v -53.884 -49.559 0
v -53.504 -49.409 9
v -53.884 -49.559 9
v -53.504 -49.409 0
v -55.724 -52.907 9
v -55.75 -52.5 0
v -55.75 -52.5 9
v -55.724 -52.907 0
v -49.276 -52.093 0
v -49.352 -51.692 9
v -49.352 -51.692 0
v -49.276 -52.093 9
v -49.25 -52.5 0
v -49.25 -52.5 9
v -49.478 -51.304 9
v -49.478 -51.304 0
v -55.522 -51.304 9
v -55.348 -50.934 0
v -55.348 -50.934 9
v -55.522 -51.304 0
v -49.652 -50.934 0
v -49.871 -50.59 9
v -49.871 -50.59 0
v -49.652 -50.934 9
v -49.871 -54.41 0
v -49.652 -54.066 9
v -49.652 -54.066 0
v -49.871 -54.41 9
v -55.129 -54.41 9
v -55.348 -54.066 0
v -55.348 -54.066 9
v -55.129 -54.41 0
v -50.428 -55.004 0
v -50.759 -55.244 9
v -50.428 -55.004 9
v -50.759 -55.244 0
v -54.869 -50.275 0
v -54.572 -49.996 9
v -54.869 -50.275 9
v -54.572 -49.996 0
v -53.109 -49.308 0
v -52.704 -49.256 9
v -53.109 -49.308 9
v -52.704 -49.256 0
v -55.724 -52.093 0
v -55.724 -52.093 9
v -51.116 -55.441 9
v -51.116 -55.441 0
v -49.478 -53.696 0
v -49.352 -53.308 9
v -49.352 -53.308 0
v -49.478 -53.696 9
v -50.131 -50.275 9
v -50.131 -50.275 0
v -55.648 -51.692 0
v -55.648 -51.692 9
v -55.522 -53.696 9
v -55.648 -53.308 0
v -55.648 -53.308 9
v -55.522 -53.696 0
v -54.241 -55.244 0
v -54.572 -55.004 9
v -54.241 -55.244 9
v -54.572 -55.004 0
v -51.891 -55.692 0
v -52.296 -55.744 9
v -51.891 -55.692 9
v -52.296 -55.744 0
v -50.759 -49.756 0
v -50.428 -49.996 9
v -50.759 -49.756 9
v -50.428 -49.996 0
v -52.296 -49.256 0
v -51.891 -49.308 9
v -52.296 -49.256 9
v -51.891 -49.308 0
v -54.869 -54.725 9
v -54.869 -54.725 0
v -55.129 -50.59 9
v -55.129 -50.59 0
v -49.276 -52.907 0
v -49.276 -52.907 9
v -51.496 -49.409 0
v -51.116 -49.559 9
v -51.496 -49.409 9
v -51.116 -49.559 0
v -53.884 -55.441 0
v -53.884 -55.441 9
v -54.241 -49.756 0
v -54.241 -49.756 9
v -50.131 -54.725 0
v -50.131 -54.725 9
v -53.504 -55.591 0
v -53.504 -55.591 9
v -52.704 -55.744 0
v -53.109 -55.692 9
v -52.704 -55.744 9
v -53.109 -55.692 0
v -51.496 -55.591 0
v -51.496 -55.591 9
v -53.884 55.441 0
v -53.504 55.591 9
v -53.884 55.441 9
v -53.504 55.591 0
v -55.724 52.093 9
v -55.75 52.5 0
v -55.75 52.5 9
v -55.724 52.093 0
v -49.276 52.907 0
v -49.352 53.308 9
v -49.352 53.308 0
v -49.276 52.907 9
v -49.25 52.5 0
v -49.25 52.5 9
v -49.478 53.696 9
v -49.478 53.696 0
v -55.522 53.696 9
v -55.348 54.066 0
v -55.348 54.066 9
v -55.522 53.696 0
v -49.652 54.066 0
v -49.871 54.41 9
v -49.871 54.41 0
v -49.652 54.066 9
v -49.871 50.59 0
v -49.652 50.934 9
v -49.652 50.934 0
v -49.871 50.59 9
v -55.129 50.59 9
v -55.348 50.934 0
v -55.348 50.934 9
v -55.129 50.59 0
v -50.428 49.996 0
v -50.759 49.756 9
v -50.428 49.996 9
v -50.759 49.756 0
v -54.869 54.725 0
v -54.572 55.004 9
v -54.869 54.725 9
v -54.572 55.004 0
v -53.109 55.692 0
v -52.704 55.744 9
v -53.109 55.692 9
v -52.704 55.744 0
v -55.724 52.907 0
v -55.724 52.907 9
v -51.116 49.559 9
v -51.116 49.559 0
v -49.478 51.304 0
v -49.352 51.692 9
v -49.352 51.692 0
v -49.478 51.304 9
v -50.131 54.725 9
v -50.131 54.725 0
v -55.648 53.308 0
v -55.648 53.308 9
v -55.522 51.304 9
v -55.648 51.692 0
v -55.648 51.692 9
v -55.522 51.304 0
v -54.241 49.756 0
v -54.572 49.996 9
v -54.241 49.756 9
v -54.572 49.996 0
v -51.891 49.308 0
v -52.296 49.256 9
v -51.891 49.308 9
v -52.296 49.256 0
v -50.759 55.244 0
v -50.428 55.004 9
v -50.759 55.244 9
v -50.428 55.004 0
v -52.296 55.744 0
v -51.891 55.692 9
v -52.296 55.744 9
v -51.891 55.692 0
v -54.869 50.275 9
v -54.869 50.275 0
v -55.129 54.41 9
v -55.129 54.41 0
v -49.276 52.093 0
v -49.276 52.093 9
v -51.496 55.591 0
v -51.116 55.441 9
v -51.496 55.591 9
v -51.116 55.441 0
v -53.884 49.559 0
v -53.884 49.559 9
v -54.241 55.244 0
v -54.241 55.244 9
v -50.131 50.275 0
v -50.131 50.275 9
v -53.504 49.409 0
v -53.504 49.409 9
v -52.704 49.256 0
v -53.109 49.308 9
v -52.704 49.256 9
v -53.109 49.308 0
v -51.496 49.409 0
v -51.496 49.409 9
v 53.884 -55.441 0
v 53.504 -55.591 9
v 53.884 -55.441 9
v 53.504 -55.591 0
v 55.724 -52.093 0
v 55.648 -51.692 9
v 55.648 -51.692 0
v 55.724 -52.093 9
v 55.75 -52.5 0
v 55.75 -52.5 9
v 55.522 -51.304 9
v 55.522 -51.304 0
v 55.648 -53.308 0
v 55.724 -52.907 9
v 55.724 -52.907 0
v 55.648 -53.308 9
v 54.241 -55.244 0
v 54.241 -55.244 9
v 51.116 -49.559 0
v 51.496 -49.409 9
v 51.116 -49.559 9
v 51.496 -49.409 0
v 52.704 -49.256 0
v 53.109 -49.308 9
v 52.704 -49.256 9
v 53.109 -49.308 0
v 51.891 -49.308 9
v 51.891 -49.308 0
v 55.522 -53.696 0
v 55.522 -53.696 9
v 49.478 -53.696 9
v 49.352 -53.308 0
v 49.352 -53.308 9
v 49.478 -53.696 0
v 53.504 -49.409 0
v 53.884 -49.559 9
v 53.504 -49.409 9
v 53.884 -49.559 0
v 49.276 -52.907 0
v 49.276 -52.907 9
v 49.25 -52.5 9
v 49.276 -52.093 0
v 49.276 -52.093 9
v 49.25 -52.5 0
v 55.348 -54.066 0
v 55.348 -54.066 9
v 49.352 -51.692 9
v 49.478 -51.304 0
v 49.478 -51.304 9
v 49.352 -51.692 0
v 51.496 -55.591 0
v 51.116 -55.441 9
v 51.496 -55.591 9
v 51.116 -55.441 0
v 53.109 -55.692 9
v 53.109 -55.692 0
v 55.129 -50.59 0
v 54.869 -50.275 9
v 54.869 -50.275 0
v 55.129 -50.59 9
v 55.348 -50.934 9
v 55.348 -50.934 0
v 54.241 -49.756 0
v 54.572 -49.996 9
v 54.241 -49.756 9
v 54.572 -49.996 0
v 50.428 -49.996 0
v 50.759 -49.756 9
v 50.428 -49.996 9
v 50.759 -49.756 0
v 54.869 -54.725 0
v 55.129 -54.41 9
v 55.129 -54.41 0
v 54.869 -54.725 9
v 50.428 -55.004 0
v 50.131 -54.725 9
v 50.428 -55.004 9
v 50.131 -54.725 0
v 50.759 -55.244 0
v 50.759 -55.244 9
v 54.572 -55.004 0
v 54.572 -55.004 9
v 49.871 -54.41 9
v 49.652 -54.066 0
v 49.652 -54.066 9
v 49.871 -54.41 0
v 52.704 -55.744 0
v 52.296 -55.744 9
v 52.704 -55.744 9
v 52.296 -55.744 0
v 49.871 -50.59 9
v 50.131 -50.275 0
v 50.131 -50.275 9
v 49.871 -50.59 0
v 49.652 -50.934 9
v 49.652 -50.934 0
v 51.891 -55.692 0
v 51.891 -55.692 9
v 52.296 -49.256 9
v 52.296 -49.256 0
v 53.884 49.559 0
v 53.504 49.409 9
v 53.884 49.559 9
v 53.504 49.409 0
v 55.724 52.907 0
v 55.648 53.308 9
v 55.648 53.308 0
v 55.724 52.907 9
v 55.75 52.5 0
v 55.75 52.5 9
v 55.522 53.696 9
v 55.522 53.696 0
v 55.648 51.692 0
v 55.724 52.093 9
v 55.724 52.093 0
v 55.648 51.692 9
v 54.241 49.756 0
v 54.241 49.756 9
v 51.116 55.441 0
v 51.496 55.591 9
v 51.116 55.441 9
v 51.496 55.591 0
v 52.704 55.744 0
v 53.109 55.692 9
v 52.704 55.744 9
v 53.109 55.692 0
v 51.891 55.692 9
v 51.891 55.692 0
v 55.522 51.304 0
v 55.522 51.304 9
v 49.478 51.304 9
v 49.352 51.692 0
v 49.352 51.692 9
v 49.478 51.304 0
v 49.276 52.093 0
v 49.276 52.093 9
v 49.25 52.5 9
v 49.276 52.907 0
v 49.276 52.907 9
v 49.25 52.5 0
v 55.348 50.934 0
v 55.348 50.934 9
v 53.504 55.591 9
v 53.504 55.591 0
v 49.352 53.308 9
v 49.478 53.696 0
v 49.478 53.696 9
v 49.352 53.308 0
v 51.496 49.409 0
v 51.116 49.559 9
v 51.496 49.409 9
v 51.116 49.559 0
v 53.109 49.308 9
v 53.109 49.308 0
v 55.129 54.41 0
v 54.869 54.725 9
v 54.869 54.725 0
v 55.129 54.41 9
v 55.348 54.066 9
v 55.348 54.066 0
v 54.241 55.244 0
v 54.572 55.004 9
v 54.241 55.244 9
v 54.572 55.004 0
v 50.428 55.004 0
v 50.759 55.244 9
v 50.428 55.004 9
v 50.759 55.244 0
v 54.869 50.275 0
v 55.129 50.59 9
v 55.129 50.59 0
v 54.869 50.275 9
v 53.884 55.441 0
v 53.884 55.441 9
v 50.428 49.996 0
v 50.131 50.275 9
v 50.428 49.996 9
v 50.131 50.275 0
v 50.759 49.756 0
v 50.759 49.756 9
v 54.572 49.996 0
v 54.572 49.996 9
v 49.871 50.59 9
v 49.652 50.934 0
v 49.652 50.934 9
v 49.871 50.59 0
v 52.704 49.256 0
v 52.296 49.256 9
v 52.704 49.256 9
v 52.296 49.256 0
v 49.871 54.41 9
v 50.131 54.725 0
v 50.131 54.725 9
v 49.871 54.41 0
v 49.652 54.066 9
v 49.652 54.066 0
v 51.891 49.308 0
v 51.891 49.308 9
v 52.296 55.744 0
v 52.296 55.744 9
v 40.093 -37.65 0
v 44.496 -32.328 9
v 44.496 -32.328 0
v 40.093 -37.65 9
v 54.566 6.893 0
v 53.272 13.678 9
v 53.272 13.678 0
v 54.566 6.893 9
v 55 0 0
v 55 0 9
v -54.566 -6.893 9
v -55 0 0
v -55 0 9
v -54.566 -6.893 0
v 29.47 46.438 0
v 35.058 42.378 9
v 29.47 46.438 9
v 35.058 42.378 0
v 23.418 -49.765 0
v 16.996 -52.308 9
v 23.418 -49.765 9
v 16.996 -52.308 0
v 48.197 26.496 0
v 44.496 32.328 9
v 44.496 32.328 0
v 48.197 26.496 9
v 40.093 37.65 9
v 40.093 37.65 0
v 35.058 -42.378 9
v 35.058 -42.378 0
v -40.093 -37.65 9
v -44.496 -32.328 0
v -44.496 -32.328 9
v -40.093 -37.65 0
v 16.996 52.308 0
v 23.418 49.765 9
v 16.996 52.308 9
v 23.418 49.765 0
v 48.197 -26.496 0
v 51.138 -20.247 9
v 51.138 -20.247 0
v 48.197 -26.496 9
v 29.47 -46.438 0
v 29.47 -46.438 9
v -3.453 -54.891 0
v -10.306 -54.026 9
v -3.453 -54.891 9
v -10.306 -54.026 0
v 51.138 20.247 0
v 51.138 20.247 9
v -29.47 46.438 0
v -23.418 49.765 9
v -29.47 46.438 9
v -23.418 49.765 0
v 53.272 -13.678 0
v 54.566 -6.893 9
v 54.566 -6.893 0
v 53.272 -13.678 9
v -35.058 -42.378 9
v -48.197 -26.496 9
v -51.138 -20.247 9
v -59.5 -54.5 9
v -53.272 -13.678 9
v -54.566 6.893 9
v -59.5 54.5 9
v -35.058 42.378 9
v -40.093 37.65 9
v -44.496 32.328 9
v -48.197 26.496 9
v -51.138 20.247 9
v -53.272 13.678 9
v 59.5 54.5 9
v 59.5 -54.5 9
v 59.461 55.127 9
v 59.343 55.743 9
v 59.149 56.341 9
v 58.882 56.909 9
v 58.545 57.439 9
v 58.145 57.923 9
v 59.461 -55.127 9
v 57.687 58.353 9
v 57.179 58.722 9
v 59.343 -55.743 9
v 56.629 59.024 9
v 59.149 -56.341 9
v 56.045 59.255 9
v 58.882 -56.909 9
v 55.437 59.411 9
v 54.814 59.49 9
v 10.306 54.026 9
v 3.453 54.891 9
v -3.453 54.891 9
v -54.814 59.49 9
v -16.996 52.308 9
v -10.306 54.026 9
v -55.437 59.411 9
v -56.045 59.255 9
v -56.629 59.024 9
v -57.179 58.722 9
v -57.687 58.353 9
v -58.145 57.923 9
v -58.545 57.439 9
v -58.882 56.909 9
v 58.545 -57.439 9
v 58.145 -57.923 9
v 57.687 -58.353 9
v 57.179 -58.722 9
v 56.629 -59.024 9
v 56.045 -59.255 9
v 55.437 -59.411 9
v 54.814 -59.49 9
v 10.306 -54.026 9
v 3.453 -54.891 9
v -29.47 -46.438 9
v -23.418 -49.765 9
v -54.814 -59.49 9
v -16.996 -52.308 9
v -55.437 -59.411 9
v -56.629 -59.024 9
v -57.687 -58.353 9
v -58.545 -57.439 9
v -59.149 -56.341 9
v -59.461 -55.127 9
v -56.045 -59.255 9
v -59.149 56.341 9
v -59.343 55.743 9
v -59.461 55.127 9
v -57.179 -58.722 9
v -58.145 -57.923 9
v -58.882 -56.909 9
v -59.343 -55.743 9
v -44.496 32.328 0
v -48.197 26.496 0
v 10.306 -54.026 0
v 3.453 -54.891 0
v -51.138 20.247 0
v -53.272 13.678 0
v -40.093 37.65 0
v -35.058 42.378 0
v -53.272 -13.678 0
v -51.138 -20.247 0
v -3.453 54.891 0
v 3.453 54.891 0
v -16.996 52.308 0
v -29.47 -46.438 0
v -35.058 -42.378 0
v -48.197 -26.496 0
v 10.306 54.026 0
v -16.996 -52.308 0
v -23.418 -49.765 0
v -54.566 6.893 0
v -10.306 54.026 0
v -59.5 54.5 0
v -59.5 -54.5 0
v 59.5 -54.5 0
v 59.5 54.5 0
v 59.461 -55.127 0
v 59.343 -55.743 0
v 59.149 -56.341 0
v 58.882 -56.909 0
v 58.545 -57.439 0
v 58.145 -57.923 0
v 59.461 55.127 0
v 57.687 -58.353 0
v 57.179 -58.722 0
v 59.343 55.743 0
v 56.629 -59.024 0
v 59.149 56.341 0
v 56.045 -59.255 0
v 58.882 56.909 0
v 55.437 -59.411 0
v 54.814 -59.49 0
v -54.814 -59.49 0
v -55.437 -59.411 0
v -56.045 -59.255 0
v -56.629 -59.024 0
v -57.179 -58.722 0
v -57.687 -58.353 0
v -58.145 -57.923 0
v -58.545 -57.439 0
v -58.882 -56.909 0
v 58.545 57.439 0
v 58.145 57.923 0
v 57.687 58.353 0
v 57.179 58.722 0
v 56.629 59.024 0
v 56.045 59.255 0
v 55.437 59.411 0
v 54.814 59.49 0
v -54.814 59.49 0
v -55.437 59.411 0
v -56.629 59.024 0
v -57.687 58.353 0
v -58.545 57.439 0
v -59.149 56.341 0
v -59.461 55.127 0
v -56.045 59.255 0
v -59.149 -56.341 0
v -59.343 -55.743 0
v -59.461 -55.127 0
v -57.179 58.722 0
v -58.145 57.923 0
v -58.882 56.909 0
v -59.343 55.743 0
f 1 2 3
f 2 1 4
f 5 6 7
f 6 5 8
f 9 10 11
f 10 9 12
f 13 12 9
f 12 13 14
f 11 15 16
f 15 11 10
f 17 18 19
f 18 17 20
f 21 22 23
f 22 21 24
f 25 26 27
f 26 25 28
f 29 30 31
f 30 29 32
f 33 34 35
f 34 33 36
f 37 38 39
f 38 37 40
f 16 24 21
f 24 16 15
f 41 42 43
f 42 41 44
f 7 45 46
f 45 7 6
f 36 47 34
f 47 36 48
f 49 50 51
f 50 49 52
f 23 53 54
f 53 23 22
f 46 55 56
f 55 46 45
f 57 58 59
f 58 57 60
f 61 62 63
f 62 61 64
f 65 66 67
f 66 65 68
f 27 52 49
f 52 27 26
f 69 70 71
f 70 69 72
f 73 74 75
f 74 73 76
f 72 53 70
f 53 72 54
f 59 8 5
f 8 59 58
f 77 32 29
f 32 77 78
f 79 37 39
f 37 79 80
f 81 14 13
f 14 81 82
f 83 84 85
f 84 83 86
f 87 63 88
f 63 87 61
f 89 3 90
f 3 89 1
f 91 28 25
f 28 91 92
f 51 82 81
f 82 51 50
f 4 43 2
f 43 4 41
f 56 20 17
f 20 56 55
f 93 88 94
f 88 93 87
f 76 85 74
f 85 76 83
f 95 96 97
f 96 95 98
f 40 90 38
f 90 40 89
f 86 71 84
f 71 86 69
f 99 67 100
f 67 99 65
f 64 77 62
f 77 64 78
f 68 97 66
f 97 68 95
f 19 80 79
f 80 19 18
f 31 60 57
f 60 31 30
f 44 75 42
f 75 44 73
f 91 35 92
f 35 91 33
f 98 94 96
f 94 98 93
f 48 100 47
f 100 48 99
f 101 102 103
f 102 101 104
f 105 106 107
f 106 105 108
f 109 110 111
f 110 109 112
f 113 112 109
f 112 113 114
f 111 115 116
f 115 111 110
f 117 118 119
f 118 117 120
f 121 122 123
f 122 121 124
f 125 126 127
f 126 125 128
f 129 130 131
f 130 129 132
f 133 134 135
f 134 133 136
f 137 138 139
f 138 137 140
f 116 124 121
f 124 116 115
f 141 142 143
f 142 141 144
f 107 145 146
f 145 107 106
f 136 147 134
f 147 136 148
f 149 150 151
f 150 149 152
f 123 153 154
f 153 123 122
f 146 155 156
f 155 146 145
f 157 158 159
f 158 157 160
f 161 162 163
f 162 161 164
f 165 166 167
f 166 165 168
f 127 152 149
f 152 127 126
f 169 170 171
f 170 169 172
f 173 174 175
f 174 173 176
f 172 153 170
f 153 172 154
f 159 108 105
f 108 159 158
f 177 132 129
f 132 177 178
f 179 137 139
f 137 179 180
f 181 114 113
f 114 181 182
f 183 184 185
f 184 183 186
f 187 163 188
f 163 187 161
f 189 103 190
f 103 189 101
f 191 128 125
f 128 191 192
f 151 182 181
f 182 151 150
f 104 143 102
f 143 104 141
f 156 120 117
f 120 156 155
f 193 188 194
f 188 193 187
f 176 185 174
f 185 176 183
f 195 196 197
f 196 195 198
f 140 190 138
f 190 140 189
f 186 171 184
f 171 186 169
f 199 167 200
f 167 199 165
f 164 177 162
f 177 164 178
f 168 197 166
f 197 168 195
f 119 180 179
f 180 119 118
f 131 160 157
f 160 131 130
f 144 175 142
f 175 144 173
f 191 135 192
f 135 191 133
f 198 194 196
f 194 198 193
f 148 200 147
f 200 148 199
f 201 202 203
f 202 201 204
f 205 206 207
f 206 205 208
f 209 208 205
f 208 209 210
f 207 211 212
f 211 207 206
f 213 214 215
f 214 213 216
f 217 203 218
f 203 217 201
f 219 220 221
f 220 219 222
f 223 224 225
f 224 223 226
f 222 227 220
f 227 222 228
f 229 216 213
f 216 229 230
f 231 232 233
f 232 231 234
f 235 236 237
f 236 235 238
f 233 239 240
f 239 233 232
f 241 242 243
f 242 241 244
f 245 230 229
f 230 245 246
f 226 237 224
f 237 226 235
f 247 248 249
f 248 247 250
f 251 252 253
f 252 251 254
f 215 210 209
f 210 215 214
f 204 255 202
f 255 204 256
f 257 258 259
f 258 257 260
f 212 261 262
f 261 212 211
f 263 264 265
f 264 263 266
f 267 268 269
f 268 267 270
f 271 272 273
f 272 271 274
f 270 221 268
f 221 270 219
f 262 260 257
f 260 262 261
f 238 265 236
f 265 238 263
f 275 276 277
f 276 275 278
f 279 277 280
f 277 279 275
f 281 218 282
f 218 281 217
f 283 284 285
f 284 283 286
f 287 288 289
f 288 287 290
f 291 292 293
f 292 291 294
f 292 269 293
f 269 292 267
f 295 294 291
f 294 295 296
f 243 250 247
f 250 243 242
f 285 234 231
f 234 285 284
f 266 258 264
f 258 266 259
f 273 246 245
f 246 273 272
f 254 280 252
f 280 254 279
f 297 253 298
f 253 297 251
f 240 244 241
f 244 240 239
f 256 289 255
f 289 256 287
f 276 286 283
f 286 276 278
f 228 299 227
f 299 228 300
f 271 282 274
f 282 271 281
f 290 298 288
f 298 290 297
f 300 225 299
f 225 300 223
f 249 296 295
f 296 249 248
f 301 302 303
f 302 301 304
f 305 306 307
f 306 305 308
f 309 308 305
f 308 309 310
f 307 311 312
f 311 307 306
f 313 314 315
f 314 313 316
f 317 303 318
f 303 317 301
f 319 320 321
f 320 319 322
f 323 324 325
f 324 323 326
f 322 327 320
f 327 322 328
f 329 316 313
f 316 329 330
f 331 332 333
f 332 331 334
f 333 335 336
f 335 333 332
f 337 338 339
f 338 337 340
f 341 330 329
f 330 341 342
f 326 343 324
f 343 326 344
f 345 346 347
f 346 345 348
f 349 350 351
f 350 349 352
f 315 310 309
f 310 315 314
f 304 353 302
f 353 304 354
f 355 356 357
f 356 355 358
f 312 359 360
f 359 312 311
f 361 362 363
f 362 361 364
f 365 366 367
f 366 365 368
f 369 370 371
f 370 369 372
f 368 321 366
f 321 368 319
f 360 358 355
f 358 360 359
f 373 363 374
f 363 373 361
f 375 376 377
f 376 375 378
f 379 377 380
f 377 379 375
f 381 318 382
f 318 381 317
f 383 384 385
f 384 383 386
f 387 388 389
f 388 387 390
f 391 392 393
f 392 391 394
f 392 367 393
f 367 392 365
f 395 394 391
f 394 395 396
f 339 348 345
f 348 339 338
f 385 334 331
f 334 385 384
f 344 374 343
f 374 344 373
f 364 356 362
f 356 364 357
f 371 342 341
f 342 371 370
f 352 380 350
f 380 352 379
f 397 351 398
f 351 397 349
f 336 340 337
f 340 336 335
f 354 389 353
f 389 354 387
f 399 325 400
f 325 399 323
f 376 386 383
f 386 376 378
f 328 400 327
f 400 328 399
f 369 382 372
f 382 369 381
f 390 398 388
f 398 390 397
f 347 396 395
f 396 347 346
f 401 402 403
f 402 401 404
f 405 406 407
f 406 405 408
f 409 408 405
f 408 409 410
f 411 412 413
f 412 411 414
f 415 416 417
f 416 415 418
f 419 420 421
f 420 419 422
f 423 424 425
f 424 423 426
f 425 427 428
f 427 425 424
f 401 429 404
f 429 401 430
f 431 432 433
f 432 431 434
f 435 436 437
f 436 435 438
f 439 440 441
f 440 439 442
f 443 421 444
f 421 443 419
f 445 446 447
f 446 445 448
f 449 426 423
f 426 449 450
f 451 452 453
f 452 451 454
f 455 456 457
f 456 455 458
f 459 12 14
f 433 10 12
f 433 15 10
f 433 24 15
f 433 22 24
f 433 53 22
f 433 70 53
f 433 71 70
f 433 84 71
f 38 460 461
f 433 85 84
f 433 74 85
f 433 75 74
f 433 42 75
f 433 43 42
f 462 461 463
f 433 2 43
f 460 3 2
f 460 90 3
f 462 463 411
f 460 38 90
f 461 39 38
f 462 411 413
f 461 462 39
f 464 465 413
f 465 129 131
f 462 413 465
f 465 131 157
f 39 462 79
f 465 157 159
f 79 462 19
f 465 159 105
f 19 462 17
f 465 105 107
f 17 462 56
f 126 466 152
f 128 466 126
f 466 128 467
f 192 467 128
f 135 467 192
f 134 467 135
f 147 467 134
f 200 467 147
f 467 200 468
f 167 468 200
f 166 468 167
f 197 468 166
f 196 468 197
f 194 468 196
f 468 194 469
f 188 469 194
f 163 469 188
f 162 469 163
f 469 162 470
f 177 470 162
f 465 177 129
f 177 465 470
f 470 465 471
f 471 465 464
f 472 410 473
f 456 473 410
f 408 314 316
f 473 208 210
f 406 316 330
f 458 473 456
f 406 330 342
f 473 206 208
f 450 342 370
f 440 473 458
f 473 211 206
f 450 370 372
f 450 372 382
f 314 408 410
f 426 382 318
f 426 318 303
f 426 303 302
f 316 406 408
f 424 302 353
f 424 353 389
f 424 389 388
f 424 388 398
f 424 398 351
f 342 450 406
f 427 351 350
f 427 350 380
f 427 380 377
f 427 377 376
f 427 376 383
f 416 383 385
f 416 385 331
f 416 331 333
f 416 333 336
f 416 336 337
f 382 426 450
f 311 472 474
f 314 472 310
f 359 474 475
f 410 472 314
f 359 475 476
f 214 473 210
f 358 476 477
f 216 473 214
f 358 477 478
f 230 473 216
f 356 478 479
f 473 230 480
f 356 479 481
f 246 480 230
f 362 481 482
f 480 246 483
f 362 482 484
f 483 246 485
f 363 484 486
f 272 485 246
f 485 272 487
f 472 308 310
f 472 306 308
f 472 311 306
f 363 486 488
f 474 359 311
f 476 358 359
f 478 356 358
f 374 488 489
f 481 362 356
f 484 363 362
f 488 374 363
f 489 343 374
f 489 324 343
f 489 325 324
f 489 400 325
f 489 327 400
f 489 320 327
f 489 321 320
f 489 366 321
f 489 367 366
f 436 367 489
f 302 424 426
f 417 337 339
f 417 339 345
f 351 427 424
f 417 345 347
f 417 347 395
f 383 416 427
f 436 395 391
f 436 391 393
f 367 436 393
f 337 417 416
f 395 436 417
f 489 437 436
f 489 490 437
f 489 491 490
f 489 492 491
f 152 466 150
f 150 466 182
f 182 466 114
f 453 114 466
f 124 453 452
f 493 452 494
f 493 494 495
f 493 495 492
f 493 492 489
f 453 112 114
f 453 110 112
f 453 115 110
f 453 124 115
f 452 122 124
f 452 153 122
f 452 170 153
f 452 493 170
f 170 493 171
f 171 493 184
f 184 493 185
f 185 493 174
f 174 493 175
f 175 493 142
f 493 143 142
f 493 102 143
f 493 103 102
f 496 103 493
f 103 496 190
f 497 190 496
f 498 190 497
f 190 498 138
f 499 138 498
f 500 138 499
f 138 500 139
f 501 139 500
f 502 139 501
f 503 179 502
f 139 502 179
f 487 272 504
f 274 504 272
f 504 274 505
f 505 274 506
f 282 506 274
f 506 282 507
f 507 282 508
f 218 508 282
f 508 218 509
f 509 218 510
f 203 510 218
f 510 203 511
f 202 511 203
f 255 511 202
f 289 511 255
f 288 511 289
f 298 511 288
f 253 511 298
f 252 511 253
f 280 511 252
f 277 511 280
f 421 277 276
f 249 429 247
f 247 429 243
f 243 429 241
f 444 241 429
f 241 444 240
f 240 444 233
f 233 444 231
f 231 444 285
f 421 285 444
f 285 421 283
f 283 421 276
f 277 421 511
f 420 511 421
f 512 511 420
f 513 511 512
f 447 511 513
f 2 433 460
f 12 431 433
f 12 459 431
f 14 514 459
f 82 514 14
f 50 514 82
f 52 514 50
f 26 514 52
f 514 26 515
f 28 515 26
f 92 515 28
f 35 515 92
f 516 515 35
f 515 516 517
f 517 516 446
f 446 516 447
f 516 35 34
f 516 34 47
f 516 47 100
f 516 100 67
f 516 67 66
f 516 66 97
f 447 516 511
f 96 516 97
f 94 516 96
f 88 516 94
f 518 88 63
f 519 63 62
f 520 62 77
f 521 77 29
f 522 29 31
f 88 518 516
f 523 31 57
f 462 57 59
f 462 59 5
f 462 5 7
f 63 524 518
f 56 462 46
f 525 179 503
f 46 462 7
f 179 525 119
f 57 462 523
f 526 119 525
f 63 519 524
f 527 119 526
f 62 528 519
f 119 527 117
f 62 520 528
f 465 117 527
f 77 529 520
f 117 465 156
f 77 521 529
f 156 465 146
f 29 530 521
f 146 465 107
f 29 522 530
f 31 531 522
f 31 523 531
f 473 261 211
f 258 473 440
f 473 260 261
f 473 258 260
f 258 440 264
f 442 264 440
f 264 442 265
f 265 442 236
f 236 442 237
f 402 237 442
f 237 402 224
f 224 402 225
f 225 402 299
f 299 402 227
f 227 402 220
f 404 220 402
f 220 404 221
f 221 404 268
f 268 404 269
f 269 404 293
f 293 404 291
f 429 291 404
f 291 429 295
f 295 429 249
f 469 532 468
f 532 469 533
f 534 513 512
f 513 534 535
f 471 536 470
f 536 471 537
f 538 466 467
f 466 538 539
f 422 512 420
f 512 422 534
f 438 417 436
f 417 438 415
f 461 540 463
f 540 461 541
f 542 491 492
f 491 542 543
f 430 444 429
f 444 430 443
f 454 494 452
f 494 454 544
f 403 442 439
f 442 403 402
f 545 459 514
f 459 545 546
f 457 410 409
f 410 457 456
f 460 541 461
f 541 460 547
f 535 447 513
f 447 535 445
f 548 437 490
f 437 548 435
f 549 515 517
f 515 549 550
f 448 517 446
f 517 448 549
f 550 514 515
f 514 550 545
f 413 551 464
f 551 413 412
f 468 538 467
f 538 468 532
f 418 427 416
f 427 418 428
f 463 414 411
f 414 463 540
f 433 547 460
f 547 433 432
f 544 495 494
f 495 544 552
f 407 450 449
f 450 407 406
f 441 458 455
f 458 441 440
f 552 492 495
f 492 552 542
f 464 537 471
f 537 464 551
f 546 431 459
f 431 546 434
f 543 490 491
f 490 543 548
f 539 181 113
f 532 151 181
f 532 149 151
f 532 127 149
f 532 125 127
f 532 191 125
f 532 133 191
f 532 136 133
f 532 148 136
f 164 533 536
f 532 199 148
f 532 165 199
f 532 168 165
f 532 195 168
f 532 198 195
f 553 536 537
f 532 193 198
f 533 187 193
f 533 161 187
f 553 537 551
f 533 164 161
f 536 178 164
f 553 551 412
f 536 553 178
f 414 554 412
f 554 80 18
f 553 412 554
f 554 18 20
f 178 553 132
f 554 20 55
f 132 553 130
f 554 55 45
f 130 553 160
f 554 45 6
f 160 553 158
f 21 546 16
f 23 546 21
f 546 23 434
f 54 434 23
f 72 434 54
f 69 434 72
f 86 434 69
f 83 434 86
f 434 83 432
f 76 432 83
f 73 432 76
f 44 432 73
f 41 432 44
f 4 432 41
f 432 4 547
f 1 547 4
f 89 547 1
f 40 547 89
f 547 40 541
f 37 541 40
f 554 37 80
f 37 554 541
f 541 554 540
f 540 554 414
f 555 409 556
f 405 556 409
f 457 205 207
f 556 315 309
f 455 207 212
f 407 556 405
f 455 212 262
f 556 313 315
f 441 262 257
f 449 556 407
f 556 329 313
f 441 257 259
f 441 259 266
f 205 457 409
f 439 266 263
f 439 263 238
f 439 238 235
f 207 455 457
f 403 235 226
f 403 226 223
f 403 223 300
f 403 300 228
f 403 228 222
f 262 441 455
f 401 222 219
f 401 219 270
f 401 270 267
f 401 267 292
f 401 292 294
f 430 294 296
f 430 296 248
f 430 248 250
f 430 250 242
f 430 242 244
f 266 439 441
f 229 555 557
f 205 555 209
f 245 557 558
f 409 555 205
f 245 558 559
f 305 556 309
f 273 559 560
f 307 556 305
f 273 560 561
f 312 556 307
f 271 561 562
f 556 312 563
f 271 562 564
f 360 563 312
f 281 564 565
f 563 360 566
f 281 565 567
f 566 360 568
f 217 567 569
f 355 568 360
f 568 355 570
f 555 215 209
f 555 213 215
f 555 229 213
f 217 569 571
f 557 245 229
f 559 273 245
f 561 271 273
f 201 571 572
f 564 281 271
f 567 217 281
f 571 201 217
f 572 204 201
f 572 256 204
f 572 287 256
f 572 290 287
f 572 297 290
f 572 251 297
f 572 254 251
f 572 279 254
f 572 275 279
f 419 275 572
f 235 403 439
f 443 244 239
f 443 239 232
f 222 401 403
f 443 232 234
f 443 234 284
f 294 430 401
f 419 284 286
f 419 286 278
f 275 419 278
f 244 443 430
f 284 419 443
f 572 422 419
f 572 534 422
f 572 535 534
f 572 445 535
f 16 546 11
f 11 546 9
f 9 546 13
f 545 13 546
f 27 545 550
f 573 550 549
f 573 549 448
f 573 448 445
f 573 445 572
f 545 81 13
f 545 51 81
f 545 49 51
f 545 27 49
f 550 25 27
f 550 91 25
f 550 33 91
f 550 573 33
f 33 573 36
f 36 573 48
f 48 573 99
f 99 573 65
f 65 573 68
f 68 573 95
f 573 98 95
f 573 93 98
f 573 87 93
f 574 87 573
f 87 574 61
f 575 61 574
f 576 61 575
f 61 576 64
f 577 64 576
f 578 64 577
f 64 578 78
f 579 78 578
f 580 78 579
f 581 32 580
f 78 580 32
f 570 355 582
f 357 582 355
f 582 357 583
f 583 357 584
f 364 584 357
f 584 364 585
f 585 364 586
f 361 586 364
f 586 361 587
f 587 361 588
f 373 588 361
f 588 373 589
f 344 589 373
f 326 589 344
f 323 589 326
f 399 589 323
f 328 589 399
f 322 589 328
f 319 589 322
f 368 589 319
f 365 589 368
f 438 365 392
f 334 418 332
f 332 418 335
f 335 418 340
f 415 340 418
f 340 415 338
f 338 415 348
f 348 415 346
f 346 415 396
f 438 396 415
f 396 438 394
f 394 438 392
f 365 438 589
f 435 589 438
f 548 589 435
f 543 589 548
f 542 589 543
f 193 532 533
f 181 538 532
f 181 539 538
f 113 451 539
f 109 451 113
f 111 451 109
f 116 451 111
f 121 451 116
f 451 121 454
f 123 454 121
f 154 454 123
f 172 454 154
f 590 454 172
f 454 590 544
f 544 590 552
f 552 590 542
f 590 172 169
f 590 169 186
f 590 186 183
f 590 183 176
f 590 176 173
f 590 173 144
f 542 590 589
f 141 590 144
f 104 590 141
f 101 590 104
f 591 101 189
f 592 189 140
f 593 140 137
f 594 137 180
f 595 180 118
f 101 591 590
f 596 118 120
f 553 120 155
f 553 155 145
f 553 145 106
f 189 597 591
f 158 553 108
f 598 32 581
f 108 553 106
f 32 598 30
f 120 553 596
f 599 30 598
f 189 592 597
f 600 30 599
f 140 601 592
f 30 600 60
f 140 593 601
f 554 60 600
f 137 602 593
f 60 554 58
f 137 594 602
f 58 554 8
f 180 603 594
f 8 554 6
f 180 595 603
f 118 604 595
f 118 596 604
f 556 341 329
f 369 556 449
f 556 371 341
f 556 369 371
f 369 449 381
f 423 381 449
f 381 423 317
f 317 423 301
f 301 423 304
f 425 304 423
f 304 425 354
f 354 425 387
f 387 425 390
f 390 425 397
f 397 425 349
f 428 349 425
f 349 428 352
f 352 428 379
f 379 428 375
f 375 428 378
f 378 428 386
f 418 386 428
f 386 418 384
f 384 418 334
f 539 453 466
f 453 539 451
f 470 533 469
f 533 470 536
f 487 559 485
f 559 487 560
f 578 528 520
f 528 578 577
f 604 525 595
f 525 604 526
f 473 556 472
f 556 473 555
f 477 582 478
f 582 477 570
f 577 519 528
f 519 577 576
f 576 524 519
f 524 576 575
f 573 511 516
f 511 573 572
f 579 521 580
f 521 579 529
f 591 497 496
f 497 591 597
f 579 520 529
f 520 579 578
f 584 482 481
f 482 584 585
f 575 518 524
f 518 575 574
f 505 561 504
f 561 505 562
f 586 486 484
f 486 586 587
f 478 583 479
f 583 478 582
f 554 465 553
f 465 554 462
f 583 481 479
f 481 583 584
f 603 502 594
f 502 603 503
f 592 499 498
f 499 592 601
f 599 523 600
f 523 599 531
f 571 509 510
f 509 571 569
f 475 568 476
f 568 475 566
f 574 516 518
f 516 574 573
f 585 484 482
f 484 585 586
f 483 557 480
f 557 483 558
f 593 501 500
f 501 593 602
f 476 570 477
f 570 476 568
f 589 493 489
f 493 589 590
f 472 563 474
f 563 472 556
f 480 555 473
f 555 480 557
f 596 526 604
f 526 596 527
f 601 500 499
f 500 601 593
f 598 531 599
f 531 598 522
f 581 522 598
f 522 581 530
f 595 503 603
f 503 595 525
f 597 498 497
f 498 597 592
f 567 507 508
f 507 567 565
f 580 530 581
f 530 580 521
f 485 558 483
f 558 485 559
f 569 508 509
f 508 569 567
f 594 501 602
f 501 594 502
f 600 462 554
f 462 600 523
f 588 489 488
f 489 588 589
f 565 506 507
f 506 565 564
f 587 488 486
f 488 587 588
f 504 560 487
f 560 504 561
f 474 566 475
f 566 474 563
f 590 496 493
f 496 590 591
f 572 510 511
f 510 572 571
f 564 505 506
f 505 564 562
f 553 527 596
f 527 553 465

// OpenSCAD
$fn = 50;

difference() {
	union() {
		hull() {
			translate(v = [-54.5, 54.5, 0]) {
				cylinder(h = 9, r = 5);
			}
			translate(v = [54.5, 54.5, 0]) {
				cylinder(h = 9, r = 5);
			}
			translate(v = [-54.5, -54.5, 0]) {
				cylinder(h = 9, r = 5);
			}
			translate(v = [54.5, -54.5, 0]) {
				cylinder(h = 9, r = 5);
			}
		}
	}
	union() {
		translate(v = [-52.5, -52.5, -100.0]) {
			cylinder(h = 200, r = 3.25);
		}
		translate(v = [-52.5, 52.5, -100.0]) {
			cylinder(h = 200, r = 3.25);
		}
		translate(v = [52.5, -52.5, -100.0]) {
			cylinder(h = 200, r = 3.25);
		}
		translate(v = [52.5, 52.5, -100.0]) {
			cylinder(h = 200, r = 3.25);
		}
		translate(v = [-52.5, -52.5, -100.0]) {
			cylinder(h = 200, r = 1.8);
		}
		translate(v = [-52.5, 52.5, -100.0]) {
			cylinder(h = 200, r = 1.8);
		}
		translate(v = [52.5, -52.5, -100.0]) {
			cylinder(h = 200, r = 1.8);
		}
		translate(v = [52.5, 52.5, -100.0]) {
			cylinder(h = 200, r = 1.8);
		}
		cylinder(h = 9, r = 55.0);
	}
}
